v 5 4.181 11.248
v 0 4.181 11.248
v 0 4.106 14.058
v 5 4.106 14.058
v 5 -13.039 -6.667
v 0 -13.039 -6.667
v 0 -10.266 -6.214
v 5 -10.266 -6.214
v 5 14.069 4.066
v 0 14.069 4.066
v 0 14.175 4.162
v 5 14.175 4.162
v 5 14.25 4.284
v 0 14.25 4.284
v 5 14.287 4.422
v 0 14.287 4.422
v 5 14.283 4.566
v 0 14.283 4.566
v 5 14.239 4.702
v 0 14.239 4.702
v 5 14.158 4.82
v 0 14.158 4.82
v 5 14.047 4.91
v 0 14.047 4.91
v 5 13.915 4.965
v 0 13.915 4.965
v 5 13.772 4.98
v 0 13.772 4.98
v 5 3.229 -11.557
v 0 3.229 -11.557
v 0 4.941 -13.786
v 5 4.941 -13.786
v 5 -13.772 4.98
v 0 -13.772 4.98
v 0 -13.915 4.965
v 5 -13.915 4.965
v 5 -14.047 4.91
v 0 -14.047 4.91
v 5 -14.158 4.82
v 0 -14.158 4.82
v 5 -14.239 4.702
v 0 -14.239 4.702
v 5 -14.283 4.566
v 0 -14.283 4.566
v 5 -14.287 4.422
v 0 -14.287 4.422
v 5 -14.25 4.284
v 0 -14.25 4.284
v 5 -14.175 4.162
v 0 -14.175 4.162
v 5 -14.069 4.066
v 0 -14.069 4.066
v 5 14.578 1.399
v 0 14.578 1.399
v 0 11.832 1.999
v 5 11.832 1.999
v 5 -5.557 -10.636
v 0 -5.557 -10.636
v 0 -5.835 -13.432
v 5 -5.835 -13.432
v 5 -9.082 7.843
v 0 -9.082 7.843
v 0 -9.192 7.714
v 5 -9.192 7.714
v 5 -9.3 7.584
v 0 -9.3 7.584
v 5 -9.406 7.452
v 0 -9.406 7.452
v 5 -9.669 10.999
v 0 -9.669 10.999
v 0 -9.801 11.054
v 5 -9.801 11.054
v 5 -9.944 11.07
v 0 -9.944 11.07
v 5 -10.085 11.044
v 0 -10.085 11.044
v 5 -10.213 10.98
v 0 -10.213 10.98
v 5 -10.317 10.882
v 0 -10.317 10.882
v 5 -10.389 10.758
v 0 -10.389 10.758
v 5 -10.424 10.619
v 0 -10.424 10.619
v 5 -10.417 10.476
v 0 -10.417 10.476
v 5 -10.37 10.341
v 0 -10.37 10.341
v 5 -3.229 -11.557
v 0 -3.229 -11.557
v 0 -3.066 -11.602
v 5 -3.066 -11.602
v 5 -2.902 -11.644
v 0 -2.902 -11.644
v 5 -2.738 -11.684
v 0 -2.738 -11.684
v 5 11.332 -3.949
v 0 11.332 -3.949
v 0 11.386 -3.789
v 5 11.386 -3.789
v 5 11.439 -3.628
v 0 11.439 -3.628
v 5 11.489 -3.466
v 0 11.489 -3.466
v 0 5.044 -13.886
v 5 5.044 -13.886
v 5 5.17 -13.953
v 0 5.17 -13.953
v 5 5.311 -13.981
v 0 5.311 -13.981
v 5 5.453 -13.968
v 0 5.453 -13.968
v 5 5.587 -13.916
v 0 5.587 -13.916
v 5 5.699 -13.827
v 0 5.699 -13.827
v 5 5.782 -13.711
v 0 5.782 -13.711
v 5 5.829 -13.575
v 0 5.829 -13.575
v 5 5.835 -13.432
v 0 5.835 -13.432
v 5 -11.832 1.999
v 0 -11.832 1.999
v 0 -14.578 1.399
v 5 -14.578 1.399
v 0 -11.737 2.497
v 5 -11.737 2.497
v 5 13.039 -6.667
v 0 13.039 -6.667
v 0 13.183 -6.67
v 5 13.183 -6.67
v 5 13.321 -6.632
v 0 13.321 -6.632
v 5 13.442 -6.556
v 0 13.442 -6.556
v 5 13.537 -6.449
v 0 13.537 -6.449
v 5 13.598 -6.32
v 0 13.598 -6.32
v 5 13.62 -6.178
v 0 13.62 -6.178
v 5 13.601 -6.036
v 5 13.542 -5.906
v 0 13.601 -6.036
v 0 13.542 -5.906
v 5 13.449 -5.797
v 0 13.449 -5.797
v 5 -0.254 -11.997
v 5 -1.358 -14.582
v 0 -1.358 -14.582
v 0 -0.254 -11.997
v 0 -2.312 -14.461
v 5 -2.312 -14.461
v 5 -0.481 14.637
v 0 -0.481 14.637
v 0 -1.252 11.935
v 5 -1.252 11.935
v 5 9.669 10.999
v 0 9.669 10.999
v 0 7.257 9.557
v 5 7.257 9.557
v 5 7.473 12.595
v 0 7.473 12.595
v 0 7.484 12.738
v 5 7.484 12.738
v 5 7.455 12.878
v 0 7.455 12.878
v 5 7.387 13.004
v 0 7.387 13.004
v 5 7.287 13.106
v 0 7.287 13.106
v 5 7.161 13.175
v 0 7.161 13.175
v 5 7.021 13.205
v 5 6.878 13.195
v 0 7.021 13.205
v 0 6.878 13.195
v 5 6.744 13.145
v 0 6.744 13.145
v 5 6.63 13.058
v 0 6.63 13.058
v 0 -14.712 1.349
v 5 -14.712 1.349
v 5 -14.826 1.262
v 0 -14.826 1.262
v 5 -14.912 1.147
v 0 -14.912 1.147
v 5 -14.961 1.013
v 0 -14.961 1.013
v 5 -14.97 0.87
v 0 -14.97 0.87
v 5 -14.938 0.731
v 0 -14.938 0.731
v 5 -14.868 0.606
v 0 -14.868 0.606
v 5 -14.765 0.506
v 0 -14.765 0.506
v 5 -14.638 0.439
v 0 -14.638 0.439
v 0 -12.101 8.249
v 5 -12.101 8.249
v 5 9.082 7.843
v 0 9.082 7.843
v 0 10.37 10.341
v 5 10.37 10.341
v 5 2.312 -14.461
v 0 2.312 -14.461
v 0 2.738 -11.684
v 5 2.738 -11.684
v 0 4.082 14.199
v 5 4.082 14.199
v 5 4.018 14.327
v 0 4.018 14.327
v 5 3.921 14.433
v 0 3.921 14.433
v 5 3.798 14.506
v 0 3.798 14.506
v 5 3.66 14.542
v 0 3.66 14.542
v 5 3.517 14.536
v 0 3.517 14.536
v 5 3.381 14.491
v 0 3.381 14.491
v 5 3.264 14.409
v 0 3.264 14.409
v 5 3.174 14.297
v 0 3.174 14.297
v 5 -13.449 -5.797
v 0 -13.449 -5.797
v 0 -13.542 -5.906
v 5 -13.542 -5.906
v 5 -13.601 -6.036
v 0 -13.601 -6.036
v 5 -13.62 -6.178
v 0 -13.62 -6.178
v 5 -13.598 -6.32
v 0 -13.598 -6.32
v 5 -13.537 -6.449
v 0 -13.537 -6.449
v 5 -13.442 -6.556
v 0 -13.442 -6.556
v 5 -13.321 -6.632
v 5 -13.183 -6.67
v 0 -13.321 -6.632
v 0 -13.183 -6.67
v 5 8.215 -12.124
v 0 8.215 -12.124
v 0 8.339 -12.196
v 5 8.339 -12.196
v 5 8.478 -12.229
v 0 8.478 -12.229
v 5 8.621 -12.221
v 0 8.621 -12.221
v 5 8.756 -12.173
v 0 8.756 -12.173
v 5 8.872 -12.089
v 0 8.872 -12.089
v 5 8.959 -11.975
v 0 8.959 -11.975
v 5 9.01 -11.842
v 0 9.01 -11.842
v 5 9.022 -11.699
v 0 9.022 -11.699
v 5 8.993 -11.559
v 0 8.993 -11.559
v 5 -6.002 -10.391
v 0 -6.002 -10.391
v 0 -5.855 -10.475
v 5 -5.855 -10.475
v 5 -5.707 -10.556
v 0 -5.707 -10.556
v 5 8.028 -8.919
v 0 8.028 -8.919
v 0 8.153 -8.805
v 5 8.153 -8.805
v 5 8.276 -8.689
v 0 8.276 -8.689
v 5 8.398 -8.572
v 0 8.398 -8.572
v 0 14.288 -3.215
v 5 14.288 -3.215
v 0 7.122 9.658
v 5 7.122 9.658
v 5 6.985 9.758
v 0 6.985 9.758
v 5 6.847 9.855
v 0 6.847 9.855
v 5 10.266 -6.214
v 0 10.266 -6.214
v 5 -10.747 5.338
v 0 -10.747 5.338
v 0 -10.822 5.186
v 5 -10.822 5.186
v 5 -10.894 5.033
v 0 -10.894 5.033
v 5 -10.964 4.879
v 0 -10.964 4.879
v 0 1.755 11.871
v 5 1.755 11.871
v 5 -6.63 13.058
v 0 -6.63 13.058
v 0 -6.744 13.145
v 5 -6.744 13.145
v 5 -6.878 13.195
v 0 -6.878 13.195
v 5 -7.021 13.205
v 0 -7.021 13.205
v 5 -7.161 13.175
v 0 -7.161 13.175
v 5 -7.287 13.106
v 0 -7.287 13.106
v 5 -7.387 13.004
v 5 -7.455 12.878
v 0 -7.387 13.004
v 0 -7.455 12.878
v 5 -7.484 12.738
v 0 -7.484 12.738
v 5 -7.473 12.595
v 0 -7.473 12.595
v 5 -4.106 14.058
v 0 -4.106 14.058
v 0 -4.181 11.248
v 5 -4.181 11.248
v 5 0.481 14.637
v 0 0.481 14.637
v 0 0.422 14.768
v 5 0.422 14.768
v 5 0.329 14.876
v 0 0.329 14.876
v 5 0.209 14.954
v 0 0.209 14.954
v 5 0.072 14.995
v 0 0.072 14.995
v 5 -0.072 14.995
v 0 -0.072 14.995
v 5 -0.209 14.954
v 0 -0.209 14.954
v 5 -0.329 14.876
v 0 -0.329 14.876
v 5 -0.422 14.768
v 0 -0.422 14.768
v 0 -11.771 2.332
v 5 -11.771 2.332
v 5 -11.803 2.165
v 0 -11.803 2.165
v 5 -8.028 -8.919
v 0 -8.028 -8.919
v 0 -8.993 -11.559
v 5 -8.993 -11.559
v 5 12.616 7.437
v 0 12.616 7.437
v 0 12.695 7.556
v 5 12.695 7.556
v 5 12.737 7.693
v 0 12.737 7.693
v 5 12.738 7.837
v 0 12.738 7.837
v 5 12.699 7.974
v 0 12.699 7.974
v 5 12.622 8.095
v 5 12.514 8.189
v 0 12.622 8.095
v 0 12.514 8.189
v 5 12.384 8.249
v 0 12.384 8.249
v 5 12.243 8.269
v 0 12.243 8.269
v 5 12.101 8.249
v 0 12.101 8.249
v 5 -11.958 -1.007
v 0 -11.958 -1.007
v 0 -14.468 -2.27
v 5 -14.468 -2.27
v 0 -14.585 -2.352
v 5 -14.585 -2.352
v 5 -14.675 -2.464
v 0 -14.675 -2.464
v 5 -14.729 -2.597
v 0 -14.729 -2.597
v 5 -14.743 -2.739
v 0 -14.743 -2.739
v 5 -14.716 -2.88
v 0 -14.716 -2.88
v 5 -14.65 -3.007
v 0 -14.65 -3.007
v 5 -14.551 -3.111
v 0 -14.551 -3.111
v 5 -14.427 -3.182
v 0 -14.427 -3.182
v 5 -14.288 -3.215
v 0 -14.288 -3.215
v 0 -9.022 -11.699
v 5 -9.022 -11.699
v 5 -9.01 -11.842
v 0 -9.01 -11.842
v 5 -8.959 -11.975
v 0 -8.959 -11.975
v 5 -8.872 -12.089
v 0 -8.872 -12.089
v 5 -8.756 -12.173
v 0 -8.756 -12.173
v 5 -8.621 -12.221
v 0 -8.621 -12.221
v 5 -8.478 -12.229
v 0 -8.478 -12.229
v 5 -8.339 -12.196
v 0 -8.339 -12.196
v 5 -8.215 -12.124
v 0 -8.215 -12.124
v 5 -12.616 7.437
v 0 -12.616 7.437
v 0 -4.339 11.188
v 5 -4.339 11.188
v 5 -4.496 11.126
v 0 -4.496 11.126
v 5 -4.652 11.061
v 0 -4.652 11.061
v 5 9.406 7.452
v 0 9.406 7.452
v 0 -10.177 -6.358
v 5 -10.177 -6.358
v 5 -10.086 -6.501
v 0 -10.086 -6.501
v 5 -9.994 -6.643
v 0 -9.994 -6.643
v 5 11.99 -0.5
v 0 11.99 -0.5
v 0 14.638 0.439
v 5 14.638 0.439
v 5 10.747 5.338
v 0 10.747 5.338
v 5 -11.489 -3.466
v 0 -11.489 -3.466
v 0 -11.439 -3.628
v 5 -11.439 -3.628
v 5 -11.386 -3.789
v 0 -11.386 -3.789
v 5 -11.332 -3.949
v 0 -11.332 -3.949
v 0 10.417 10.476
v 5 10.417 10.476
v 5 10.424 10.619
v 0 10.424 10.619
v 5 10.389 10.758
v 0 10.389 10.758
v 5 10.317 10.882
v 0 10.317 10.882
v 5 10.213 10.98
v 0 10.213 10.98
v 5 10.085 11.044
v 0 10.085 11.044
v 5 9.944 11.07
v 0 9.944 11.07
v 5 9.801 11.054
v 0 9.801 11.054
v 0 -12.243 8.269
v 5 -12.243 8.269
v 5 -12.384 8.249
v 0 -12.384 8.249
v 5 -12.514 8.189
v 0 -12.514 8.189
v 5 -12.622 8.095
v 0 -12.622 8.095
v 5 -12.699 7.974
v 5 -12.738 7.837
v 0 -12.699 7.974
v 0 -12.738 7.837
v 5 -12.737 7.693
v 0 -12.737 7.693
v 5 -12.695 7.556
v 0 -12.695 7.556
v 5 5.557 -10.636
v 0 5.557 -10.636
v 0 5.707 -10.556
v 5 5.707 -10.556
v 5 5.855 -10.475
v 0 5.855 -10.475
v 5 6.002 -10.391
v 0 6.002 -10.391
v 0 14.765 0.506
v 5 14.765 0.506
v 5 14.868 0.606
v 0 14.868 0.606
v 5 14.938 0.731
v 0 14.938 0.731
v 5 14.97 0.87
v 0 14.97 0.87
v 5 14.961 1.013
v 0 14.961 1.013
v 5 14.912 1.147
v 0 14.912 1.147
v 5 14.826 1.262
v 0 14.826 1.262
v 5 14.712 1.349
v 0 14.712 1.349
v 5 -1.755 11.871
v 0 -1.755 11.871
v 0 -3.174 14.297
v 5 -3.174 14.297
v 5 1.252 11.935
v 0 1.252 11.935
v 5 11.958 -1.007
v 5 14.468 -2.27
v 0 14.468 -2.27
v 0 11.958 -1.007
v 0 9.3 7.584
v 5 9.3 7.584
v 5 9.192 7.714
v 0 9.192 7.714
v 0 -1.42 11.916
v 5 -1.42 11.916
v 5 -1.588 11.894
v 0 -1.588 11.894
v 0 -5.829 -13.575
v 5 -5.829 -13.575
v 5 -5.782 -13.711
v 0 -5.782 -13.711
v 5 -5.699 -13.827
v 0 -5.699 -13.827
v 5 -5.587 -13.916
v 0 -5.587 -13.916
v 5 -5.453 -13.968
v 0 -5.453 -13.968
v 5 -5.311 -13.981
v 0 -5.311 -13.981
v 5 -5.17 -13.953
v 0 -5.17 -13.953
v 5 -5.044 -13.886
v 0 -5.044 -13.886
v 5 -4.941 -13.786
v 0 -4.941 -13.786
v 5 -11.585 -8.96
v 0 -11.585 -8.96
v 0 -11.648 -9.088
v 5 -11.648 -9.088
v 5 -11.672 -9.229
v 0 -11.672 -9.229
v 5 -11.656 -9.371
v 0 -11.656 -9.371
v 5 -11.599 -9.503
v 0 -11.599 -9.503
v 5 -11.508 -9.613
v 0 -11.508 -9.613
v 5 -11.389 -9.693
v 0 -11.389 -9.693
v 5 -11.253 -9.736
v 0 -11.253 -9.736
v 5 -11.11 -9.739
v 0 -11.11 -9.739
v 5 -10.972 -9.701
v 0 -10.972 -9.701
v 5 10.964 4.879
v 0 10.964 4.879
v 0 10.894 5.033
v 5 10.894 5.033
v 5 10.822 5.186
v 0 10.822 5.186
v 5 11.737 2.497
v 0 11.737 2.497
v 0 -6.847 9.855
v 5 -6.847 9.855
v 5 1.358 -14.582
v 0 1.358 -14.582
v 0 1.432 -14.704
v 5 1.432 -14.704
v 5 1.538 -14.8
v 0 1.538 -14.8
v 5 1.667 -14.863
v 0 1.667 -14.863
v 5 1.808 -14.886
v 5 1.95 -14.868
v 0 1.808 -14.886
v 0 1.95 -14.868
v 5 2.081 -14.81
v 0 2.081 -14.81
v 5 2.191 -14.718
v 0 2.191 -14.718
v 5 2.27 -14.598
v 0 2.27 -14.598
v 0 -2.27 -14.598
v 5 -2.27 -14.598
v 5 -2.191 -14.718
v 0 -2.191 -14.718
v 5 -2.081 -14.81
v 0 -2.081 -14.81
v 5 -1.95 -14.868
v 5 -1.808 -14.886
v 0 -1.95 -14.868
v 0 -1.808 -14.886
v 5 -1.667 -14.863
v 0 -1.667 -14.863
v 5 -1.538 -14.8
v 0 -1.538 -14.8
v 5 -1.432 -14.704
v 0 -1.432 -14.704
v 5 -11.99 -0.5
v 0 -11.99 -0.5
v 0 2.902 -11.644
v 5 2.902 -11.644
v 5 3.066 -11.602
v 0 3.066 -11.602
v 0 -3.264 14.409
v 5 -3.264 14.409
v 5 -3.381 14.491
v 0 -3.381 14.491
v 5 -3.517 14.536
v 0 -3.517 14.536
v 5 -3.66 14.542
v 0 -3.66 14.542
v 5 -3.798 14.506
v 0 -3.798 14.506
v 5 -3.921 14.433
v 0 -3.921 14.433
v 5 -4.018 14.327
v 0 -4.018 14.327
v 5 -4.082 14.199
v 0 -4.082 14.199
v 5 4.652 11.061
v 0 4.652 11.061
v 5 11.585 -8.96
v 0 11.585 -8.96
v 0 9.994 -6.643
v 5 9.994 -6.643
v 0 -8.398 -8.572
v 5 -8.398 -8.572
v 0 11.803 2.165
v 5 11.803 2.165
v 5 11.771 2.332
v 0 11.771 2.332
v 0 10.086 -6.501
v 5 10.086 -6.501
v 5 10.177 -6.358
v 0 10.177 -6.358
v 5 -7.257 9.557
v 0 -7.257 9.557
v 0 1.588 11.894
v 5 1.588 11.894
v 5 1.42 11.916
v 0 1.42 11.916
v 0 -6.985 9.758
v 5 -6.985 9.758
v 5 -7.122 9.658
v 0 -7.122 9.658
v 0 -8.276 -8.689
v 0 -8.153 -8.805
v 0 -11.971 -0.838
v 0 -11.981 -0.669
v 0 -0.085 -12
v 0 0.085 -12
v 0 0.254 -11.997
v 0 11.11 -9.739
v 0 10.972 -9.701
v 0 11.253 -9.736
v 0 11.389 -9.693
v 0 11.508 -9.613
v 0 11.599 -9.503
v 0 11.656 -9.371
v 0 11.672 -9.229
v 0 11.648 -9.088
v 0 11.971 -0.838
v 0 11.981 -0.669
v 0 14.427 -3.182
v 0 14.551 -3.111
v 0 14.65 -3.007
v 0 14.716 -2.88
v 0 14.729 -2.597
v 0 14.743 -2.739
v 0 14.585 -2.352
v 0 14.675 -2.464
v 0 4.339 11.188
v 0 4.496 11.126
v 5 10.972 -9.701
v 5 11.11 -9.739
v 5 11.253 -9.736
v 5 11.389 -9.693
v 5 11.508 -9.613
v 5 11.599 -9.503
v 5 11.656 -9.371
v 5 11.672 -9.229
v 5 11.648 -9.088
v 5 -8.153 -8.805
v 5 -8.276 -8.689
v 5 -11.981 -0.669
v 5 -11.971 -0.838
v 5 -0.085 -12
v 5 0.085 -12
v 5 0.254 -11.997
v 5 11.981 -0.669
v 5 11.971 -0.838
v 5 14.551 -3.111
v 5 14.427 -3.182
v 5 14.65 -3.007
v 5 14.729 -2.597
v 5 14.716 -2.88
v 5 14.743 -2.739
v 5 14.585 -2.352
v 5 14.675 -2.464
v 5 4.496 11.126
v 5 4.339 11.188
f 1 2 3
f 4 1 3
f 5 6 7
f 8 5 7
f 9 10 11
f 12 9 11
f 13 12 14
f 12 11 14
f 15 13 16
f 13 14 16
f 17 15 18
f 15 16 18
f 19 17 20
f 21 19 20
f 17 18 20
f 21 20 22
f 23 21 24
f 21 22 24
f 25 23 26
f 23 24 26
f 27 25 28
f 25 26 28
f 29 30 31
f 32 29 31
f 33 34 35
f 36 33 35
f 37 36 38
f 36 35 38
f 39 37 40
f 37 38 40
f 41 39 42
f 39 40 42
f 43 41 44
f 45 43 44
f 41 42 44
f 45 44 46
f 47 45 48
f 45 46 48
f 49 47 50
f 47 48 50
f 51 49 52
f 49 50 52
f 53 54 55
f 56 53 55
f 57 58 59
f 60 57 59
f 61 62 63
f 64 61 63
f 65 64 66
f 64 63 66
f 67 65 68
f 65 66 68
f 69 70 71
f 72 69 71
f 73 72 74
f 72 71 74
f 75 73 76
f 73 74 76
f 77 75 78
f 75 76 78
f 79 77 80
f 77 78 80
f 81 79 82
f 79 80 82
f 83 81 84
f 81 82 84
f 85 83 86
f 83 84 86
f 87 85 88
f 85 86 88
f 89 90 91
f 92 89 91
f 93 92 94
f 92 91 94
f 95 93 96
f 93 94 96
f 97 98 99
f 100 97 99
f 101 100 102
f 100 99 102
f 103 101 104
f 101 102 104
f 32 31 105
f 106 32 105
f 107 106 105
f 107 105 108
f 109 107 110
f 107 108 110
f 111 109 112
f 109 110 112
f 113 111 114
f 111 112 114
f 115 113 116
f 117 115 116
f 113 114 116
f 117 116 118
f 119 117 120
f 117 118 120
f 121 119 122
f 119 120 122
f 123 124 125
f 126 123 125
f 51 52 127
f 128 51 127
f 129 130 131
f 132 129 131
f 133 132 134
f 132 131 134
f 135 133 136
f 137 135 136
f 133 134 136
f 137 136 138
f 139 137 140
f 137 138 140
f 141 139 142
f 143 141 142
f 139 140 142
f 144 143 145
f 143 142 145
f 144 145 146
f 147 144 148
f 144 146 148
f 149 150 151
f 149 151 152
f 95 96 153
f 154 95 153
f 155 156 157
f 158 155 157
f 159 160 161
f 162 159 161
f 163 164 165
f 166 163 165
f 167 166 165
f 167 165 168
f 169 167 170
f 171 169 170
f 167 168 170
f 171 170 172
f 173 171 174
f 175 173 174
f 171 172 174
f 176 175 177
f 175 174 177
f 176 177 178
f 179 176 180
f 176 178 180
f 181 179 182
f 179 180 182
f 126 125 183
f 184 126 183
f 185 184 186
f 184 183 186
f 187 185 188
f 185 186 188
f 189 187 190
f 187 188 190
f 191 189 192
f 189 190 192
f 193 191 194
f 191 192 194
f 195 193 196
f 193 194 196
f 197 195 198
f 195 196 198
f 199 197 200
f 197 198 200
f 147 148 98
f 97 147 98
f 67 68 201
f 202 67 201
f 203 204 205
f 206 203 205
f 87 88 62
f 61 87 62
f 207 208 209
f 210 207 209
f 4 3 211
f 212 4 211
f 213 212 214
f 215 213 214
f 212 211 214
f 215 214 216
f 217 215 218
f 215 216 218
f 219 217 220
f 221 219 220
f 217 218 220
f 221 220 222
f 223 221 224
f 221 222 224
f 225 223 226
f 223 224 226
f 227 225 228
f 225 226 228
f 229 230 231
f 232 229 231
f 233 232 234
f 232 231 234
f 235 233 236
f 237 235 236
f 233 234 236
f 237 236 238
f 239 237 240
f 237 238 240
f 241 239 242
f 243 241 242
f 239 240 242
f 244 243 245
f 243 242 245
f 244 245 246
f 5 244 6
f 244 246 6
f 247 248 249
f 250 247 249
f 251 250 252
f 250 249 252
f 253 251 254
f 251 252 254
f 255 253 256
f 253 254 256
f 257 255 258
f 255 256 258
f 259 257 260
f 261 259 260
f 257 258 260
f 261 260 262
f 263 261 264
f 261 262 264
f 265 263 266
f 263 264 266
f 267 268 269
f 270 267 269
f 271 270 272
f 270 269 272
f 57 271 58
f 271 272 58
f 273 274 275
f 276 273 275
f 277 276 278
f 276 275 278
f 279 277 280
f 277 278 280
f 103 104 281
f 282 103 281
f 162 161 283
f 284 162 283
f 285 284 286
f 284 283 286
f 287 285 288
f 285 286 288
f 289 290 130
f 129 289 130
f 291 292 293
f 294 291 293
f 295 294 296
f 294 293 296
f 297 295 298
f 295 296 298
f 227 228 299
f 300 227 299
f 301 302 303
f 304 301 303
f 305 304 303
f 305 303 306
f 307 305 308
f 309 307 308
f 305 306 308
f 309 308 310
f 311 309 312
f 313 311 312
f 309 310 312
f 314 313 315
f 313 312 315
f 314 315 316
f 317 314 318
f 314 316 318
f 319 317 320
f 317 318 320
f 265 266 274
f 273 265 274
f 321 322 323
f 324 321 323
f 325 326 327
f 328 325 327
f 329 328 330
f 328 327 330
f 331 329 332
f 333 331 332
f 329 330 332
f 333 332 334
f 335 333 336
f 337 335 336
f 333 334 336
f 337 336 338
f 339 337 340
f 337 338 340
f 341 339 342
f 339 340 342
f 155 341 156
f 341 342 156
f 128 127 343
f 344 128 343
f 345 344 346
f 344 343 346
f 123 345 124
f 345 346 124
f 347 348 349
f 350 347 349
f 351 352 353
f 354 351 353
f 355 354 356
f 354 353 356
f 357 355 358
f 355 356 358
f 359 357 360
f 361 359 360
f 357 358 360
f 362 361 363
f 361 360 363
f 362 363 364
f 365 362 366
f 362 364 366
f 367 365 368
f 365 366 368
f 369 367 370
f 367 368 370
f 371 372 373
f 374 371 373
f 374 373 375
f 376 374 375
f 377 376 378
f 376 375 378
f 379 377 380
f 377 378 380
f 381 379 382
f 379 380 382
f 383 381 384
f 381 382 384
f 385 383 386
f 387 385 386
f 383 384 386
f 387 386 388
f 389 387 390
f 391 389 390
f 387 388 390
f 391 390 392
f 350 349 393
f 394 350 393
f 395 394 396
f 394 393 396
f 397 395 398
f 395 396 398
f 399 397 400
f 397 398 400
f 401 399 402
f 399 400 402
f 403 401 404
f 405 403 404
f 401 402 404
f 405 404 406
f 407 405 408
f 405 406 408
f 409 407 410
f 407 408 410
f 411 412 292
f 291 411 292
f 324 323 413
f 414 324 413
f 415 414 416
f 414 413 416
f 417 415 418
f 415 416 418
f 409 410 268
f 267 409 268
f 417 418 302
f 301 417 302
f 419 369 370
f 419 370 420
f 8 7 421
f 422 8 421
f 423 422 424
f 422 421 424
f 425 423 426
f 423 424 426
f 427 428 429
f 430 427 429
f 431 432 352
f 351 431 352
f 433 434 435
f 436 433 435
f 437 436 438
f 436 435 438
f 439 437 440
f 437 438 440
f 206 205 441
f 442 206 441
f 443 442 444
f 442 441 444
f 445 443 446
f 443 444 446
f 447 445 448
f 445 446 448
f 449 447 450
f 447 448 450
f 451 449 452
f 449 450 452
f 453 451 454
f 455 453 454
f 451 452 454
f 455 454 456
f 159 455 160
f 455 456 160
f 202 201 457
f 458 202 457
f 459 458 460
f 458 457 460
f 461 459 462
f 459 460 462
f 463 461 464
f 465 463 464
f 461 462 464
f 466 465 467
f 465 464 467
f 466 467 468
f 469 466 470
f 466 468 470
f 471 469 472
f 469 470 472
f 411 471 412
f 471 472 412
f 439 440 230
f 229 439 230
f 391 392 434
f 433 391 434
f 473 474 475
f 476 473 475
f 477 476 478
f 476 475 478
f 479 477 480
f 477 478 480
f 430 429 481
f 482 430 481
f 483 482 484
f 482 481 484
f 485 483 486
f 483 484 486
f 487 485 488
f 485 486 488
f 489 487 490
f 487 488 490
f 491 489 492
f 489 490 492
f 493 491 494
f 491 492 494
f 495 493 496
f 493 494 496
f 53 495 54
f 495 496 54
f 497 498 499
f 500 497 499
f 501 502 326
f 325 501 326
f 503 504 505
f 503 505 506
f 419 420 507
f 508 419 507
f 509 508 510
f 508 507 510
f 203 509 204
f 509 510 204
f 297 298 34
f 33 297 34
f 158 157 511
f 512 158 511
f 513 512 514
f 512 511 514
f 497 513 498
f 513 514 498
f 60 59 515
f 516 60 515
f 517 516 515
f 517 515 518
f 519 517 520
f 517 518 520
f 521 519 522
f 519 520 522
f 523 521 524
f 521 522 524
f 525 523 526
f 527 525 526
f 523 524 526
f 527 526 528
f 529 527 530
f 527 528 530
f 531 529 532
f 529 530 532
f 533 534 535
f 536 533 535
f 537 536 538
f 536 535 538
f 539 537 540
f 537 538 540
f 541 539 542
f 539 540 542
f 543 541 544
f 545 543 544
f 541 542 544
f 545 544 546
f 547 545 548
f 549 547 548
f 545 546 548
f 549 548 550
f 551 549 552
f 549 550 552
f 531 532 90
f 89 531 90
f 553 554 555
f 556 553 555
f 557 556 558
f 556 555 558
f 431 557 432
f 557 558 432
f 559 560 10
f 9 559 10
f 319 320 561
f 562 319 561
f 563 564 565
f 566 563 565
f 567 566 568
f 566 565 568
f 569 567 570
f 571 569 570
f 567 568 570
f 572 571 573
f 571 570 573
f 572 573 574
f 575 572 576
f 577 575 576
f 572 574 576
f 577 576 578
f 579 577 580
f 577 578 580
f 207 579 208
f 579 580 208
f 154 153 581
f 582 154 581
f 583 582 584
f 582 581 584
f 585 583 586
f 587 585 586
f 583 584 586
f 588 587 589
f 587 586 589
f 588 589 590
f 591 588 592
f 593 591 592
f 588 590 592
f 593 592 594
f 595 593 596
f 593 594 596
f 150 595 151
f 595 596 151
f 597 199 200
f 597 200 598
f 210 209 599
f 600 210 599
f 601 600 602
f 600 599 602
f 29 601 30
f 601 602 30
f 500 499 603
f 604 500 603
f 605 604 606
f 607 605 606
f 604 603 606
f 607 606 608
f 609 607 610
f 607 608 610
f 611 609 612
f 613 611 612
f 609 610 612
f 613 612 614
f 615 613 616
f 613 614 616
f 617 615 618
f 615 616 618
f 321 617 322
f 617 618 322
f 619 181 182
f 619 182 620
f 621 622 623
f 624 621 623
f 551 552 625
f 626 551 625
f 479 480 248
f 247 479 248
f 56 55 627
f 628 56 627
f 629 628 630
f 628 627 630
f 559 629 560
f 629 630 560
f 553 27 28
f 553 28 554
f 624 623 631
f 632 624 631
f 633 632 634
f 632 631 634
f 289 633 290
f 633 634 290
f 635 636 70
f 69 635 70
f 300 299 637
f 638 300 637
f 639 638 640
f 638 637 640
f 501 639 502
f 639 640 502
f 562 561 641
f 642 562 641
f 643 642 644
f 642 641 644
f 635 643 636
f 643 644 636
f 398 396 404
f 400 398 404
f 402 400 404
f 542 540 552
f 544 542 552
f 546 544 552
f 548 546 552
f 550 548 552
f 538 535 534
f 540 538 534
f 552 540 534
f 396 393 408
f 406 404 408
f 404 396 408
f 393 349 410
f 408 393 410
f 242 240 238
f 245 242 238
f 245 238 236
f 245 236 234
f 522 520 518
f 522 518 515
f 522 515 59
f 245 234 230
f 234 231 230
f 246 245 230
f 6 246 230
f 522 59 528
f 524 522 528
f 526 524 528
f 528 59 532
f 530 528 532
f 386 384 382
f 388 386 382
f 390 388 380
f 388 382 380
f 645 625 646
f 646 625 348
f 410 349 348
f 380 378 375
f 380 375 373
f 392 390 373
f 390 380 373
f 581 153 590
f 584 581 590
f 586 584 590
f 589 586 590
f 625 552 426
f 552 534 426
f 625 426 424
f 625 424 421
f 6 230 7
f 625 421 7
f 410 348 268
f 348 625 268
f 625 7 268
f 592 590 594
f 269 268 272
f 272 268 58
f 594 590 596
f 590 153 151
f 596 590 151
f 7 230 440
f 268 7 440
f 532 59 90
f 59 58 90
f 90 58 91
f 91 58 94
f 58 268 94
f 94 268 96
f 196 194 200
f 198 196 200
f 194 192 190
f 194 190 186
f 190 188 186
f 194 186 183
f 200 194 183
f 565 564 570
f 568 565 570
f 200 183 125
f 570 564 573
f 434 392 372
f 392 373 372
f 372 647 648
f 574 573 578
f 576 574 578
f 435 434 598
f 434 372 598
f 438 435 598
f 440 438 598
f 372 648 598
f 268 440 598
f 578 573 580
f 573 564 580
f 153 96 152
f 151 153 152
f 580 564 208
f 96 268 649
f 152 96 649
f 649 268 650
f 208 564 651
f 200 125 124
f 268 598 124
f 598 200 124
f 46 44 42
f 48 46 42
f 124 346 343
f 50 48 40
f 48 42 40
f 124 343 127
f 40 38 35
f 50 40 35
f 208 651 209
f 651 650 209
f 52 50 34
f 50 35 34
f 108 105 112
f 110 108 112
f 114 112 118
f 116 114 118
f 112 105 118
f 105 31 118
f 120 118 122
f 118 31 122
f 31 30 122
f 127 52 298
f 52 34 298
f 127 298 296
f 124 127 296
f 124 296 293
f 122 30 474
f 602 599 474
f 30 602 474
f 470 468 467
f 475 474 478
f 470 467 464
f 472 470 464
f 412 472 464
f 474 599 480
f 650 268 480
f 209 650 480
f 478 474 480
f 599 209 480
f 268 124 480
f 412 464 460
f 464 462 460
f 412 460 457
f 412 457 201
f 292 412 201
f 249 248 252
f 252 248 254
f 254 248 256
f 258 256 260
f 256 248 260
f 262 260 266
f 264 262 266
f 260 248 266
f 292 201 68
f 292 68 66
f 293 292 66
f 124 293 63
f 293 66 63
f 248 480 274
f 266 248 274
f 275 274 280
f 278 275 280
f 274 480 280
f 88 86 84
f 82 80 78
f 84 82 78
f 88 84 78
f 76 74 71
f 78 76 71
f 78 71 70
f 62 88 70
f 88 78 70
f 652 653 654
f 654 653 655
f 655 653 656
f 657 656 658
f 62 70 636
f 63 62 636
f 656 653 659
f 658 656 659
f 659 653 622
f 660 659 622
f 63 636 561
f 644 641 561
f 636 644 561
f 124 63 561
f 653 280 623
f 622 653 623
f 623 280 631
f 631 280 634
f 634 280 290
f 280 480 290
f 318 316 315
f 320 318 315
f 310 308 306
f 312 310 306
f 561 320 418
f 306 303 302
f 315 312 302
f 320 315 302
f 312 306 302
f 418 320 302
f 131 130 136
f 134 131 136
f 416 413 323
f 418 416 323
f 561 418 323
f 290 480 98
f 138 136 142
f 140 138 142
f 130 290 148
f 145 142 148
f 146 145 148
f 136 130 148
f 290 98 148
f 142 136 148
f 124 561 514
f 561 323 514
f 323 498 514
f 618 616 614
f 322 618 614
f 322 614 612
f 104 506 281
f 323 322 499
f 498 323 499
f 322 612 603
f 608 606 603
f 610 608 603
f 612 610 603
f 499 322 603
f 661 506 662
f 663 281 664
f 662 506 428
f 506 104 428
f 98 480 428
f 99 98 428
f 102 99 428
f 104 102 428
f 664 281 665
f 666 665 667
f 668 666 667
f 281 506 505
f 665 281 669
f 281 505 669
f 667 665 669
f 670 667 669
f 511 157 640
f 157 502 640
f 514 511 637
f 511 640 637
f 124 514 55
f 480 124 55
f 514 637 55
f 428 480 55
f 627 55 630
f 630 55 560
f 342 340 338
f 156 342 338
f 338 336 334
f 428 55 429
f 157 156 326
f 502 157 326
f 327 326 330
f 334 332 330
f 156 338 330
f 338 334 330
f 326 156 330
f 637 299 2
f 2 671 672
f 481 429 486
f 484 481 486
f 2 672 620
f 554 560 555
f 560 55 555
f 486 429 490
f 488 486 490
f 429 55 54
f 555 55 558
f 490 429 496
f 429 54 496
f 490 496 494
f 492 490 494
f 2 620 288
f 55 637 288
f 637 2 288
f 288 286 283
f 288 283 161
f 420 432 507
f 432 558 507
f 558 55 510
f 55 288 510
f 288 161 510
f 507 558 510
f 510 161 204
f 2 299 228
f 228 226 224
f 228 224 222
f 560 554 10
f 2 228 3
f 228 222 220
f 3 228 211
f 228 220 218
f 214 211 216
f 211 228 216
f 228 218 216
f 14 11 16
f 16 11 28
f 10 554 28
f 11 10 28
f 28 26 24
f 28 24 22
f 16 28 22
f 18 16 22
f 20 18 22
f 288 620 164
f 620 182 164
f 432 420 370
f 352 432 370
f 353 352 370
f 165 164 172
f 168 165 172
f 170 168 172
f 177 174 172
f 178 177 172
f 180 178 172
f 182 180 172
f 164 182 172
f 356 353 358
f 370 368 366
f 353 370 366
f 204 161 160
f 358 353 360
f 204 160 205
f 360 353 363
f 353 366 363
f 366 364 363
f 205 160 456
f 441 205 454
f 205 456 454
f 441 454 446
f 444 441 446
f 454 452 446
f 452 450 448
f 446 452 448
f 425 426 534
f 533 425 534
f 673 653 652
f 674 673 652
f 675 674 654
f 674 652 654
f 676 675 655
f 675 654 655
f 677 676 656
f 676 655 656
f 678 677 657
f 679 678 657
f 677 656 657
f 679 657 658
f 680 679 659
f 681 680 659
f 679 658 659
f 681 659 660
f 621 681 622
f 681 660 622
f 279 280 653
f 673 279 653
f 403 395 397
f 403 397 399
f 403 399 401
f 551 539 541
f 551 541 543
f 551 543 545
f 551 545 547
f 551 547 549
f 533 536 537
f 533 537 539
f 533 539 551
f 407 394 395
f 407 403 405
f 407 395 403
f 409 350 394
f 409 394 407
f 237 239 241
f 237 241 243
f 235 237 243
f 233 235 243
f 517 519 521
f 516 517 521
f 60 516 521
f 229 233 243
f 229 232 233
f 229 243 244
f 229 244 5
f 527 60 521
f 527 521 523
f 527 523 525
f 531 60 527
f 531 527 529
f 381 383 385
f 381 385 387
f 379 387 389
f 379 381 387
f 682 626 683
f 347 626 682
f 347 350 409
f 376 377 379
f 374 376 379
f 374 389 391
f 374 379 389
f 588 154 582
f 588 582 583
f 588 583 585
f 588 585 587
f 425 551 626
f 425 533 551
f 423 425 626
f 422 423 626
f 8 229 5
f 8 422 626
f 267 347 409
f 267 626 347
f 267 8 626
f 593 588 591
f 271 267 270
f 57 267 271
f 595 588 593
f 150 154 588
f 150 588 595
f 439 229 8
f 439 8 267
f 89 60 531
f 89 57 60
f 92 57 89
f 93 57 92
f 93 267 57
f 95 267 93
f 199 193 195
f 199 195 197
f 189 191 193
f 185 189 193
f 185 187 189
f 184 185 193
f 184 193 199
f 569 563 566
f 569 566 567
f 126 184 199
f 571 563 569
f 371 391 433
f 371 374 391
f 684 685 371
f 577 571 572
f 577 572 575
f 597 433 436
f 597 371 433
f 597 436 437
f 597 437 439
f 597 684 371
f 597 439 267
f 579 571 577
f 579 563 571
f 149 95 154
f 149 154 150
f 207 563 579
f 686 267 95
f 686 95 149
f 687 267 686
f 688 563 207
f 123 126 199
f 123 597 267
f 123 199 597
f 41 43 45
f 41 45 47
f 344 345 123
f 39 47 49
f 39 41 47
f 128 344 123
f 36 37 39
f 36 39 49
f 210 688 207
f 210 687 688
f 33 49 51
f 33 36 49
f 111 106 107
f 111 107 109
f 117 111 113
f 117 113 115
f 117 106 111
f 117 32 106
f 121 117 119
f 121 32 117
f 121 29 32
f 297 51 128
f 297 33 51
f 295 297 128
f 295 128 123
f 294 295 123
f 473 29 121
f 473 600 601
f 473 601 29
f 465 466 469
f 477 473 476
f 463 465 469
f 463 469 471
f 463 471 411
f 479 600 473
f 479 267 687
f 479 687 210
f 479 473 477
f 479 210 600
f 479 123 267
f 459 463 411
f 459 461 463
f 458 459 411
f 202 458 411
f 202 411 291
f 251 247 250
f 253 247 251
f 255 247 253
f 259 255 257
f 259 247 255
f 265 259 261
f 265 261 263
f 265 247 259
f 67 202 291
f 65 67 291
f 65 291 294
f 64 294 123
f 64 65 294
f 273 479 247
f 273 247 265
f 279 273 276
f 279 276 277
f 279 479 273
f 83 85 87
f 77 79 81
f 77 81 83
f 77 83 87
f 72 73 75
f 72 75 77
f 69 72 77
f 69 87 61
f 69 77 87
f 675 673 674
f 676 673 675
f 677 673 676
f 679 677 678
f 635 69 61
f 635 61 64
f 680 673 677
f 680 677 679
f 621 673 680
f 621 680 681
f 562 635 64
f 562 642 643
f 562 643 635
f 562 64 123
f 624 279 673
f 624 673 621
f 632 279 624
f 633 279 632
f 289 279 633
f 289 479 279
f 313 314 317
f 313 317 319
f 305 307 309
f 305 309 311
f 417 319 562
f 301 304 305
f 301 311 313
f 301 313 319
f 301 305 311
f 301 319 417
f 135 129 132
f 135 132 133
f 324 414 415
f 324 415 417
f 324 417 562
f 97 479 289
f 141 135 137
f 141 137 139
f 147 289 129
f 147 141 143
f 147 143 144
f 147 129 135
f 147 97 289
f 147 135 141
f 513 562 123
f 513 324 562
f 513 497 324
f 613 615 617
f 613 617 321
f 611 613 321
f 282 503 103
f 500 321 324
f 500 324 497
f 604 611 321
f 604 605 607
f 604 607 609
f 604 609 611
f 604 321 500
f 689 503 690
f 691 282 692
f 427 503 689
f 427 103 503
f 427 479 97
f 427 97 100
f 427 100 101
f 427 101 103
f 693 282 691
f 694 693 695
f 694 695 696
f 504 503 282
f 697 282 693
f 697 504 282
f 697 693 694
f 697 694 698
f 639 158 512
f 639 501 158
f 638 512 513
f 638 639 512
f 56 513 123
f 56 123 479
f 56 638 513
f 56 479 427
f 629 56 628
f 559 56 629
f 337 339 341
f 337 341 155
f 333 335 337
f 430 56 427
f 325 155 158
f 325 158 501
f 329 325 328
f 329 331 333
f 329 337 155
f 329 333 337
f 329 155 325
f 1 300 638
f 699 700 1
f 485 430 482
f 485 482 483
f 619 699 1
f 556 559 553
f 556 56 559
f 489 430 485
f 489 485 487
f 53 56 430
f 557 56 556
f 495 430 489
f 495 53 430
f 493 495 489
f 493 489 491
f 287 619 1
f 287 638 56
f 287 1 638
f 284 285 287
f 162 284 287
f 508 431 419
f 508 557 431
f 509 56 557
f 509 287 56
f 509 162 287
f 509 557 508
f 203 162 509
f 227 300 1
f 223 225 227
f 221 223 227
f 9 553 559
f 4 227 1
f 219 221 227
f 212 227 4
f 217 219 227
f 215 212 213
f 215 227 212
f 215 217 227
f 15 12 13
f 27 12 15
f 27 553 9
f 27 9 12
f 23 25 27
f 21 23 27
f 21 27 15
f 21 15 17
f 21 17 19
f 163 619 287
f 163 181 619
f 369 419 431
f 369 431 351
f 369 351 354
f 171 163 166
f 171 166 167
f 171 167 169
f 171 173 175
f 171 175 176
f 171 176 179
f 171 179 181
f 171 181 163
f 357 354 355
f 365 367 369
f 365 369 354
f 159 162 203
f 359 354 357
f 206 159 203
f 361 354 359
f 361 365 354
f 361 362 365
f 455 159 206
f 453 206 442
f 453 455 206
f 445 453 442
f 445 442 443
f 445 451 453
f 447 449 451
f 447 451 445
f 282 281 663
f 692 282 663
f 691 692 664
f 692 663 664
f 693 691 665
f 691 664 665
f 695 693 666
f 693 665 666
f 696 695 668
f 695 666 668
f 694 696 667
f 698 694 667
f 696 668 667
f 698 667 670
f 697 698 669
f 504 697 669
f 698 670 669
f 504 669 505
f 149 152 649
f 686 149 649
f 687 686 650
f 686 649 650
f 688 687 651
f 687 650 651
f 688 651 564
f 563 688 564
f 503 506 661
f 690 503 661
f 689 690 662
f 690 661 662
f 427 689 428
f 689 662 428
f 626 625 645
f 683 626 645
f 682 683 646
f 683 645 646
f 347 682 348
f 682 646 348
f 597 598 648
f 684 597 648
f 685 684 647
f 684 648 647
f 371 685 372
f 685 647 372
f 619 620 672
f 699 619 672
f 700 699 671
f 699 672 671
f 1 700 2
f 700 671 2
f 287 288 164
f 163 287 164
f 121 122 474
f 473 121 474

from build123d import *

# Parameters (mm, degrees)
F1_DEPTH = 5


with BuildPart() as f1:
    # F0 (on Right) → F1 (new body)
    with BuildSketch(Plane.YZ):
        with BuildLine():
            Line((1.251901, 11.934519), (0.480814, 14.637179))
            ThreePointArc((0.480814, 14.637179), (0, 15), (-0.480814, 14.637179))
            Line((-0.480814, 14.637179), (-1.251901, 11.934519))
            ThreePointArc((-1.251901, 11.934519), (0, 12), (1.251901, 11.934519))
        make_face()
        with BuildLine():
            ThreePointArc((1.755424, 11.870909), (1.503999, 11.905376), (1.251901, 11.934519))
            ThreePointArc((1.251901, 11.934519), (0, 12), (-1.251901, 11.934519))
            ThreePointArc((-1.251901, 11.934519), (-1.503999, 11.905376), (-1.755424, 11.870909))
            ThreePointArc((-1.755424, 11.870909), (-2.984279, 11.622998), (-4.180564, 11.248239))
            ThreePointArc((-4.180564, 11.248239), (-4.417495, 11.157318), (-4.652449, 11.061407))
            ThreePointArc((-4.652449, 11.061407), (-5.781044, 10.51568), (-6.846547, 9.855191))
            ThreePointArc((-6.846547, 9.855191), (-7.053423, 9.708204), (-7.257144, 9.556875))
            ThreePointArc((-7.257144, 9.556875), (-8.214565, 8.747624), (-9.082337, 7.842905))
            ThreePointArc((-9.082337, 7.842905), (-9.246159, 7.649088), (-9.405846, 7.45185))
            ThreePointArc((-9.405846, 7.45185), (-10.131935, 6.429922), (-10.74745, 5.33782))
            ThreePointArc((-10.74745, 5.33782), (-10.857925, 5.109351), (-10.963544, 4.878598))
            ThreePointArc((-10.963544, 4.878598), (-11.412678, 3.708204), (-11.737261, 2.497341))
            ThreePointArc((-11.737261, 2.497341), (-11.787447, 2.248576), (-11.832361, 1.998805))
            ThreePointArc((-11.832361, 1.998805), (-11.976321, 0.753486), (-11.989576, -0.500056))
            ThreePointArc((-11.989576, -0.500056), (-11.976321, -0.753486), (-11.957709, -1.00658))
            ThreePointArc((-11.957709, -1.00658), (-11.787447, -2.248576), (-11.488543, -3.466032))
            ThreePointArc((-11.488543, -3.466032), (-11.412678, -3.708204), (-11.331709, -3.948717))
            ThreePointArc((-11.331709, -3.948717), (-10.857925, -5.109351), (-10.265642, -6.214225))
            ThreePointArc((-10.265642, -6.214225), (-10.131935, -6.429922), (-9.993697, -6.642743))
            ThreePointArc((-9.993697, -6.642743), (-9.246159, -7.649088), (-8.397713, -8.571955))
            ThreePointArc((-8.397713, -8.571955), (-8.214565, -8.747624), (-8.027743, -8.91938))
            ThreePointArc((-8.027743, -8.91938), (-7.053423, -9.708204), (-6.002125, -10.391077))
            ThreePointArc((-6.002125, -10.391077), (-5.781044, -10.51568), (-5.557377, -10.63558))
            ThreePointArc((-5.557377, -10.63558), (-4.417495, -11.157318), (-3.229402, -11.557291))
            ThreePointArc((-3.229402, -11.557291), (-2.984279, -11.622998), (-2.737821, -11.683507))
            ThreePointArc((-2.737821, -11.683507), (-1.503999, -11.905376), (-0.253763, -11.997317))
            ThreePointArc((-0.253763, -11.997317), (0, -12), (0.253763, -11.997317))
            ThreePointArc((0.253763, -11.997317), (1.503999, -11.905376), (2.737821, -11.683507))
            ThreePointArc((2.737821, -11.683507), (2.984279, -11.622998), (3.229402, -11.557291))
            ThreePointArc((3.229402, -11.557291), (4.417495, -11.157318), (5.557377, -10.63558))
            ThreePointArc((5.557377, -10.63558), (5.781044, -10.51568), (6.002125, -10.391077))
            ThreePointArc((6.002125, -10.391077), (7.053423, -9.708204), (8.027743, -8.91938))
            ThreePointArc((8.027743, -8.91938), (8.214565, -8.747624), (8.397713, -8.571955))
            ThreePointArc((8.397713, -8.571955), (9.246159, -7.649088), (9.993697, -6.642743))
            ThreePointArc((9.993697, -6.642743), (10.131935, -6.429922), (10.265642, -6.214225))
            ThreePointArc((10.265642, -6.214225), (10.857925, -5.109351), (11.331709, -3.948717))
            ThreePointArc((11.331709, -3.948717), (11.412678, -3.708204), (11.488543, -3.466032))
            ThreePointArc((11.488543, -3.466032), (11.787447, -2.248576), (11.957709, -1.00658))
            ThreePointArc((11.957709, -1.00658), (11.976321, -0.753486), (11.989576, -0.500056))
            ThreePointArc((11.989576, -0.500056), (11.997394, -0.250082), (12, 0))
            ThreePointArc((12, 0), (11.958017, 1.002911), (11.832361, 1.998805))
            ThreePointArc((11.832361, 1.998805), (11.787447, 2.248576), (11.737261, 2.497341))
            ThreePointArc((11.737261, 2.497341), (11.412678, 3.708204), (10.963544, 4.878598))
            ThreePointArc((10.963544, 4.878598), (10.857925, 5.109351), (10.74745, 5.33782))
            ThreePointArc((10.74745, 5.33782), (10.131935, 6.429922), (9.405846, 7.45185))
            ThreePointArc((9.405846, 7.45185), (9.246159, 7.649088), (9.082337, 7.842905))
            ThreePointArc((9.082337, 7.842905), (8.214565, 8.747624), (7.257144, 9.556875))
            ThreePointArc((7.257144, 9.556875), (7.053423, 9.708204), (6.846547, 9.855191))
            ThreePointArc((6.846547, 9.855191), (5.781044, 10.51568), (4.652449, 11.061407))
            ThreePointArc((4.652449, 11.061407), (4.417495, 11.157318), (4.180564, 11.248239))
            ThreePointArc((4.180564, 11.248239), (2.984279, 11.622998), (1.755424, 11.870909))
        make_face()
        with BuildLine():
            Line((3.17441, 14.296899), (1.755424, 11.870909))
            ThreePointArc((1.755424, 11.870909), (2.984279, 11.622998), (4.180564, 11.248239))
            Line((4.180564, 11.248239), (4.105827, 14.057752))
            ThreePointArc((4.105827, 14.057752), (3.730348, 14.528747), (3.17441, 14.296899))
        make_face()
        with BuildLine():
            ThreePointArc((-4.180564, 11.248239), (-2.984279, 11.622998), (-1.755424, 11.870909))
            Line((-1.755424, 11.870909), (-3.17441, 14.296899))
            ThreePointArc((-3.17441, 14.296899), (-3.730348, 14.528747), (-4.105827, 14.057752))
            Line((-4.105827, 14.057752), (-4.180564, 11.248239))
        make_face()
        with BuildLine():
            Line((6.630175, 13.058292), (4.652449, 11.061407))
            ThreePointArc((4.652449, 11.061407), (5.781044, 10.51568), (6.846547, 9.855191))
            Line((6.846547, 9.855191), (7.472855, 12.595024))
            ThreePointArc((7.472855, 12.595024), (7.226305, 13.1446), (6.630175, 13.058292))
        make_face()
        with BuildLine():
            ThreePointArc((-6.846547, 9.855191), (-5.781044, 10.51568), (-4.652449, 11.061407))
            Line((-4.652449, 11.061407), (-6.630175, 13.058292))
            ThreePointArc((-6.630175, 13.058292), (-7.226305, 13.1446), (-7.472855, 12.595024))
            Line((-7.472855, 12.595024), (-6.846547, 9.855191))
        make_face()
        with BuildLine():
            Line((9.669341, 10.999184), (7.257144, 9.556875))
            ThreePointArc((7.257144, 9.556875), (8.214565, 8.747624), (9.082337, 7.842905))
            Line((9.082337, 7.842905), (10.370337, 10.340905))
            ThreePointArc((10.370337, 10.340905), (10.268207, 10.934529), (9.669341, 10.999184))
        make_face()
        with BuildLine():
            ThreePointArc((-9.082337, 7.842905), (-8.214565, 8.747624), (-7.257144, 9.556875))
            Line((-7.257144, 9.556875), (-9.669341, 10.999184))
            ThreePointArc((-9.669341, 10.999184), (-10.268207, 10.934529), (-10.370337, 10.340905))
            Line((-10.370337, 10.340905), (-9.082337, 7.842905))
        make_face()
        with BuildLine():
            Line((12.100946, 8.248957), (9.405846, 7.45185))
            ThreePointArc((9.405846, 7.45185), (10.131935, 6.429922), (10.74745, 5.33782))
            Line((10.74745, 5.33782), (12.616212, 7.437028))
            ThreePointArc((12.616212, 7.437028), (12.664919, 8.037402), (12.100946, 8.248957))
        make_face()
        with BuildLine():
            ThreePointArc((-10.74745, 5.33782), (-10.131935, 6.429922), (-9.405846, 7.45185))
            Line((-9.405846, 7.45185), (-12.100946, 8.248957))
            ThreePointArc((-12.100946, 8.248957), (-12.664919, 8.037402), (-12.616212, 7.437028))
            Line((-12.616212, 7.437028), (-10.74745, 5.33782))
        make_face()
        with BuildLine():
            Line((13.772205, 4.980418), (10.963544, 4.878598))
            ThreePointArc((10.963544, 4.878598), (11.412678, 3.708204), (11.737261, 2.497341))
            Line((11.737261, 2.497341), (14.069364, 4.065856))
            ThreePointArc((14.069364, 4.065856), (14.265848, 4.635255), (13.772205, 4.980418))
        make_face()
        with BuildLine():
            ThreePointArc((-11.737261, 2.497341), (-11.412678, 3.708204), (-10.963544, 4.878598))
            Line((-10.963544, 4.878598), (-13.772205, 4.980418))
            ThreePointArc((-13.772205, 4.980418), (-14.265848, 4.635255), (-14.069364, 4.065856))
            Line((-14.069364, 4.065856), (-11.737261, 2.497341))
        make_face()
        with BuildLine():
            Line((14.578106, 1.398941), (11.832361, 1.998805))
            ThreePointArc((11.832361, 1.998805), (11.958017, 1.002911), (12, 0))
            ThreePointArc((12, 0), (11.997394, -0.250082), (11.989576, -0.500056))
            Line((11.989576, -0.500056), (14.638487, 0.439211))
            ThreePointArc((14.638487, 0.439211), (14.970401, 0.941858), (14.578106, 1.398941))
        make_face()
        with BuildLine():
            ThreePointArc((-11.989576, -0.500056), (-11.976321, 0.753486), (-11.832361, 1.998805))
            Line((-11.832361, 1.998805), (-14.578106, 1.398941))
            ThreePointArc((-14.578106, 1.398941), (-14.970401, 0.941858), (-14.638487, 0.439211))
            Line((-14.638487, 0.439211), (-11.989576, -0.500056))
        make_face()
        with BuildLine():
            ThreePointArc((-11.488543, -3.466032), (-11.787447, -2.248576), (-11.957709, -1.00658))
            Line((-11.957709, -1.00658), (-14.46801, -2.270437))
            ThreePointArc((-14.46801, -2.270437), (-14.734309, -2.81072), (-14.287819, -3.215031))
            Line((-14.287819, -3.215031), (-11.488543, -3.466032))
        make_face()
        with BuildLine():
            Line((14.46801, -2.270437), (11.957709, -1.00658))
            ThreePointArc((11.957709, -1.00658), (11.787447, -2.248576), (11.488543, -3.466032))
            Line((11.488543, -3.466032), (14.287819, -3.215031))
            ThreePointArc((14.287819, -3.215031), (14.734309, -2.81072), (14.46801, -2.270437))
        make_face()
        with BuildLine():
            ThreePointArc((-10.265642, -6.214225), (-10.857925, -5.109351), (-11.331709, -3.948717))
            Line((-11.331709, -3.948717), (-13.448836, -5.797155))
            ThreePointArc((-13.448836, -5.797155), (-13.572406, -6.386689), (-13.039395, -6.667261))
            Line((-13.039395, -6.667261), (-10.265642, -6.214225))
        make_face()
        with BuildLine():
            Line((13.448836, -5.797155), (11.331709, -3.948717))
            ThreePointArc((11.331709, -3.948717), (10.857925, -5.109351), (10.265642, -6.214225))
            Line((10.265642, -6.214225), (13.039395, -6.667261))
            ThreePointArc((13.039395, -6.667261), (13.572406, -6.386689), (13.448836, -5.797155))
        make_face()
        with BuildLine():
            ThreePointArc((-8.397713, -8.571955), (-9.246159, -7.649088), (-9.993697, -6.642743))
            Line((-9.993697, -6.642743), (-11.584623, -8.959616))
            ThreePointArc((-11.584623, -8.959616), (-11.557699, -9.56136), (-10.971658, -9.700563))
            Line((-10.971658, -9.700563), (-8.397713, -8.571955))
        make_face()
        with BuildLine():
            Line((11.584623, -8.959616), (9.993697, -6.642743))
            ThreePointArc((9.993697, -6.642743), (9.246159, -7.649088), (8.397713, -8.571955))
            Line((8.397713, -8.571955), (10.971658, -9.700563))
            ThreePointArc((10.971658, -9.700563), (11.557699, -9.56136), (11.584623, -8.959616))
        make_face()
        with BuildLine():
            ThreePointArc((-6.002125, -10.391077), (-7.053423, -9.708204), (-8.027743, -8.91938))
            Line((-8.027743, -8.91938), (-8.992505, -11.559112))
            ThreePointArc((-8.992505, -11.559112), (-8.816779, -12.135255), (-8.214532, -12.124342))
            Line((-8.214532, -12.124342), (-6.002125, -10.391077))
        make_face()
        with BuildLine():
            Line((8.992505, -11.559112), (8.027743, -8.91938))
            ThreePointArc((8.027743, -8.91938), (7.053423, -9.708204), (6.002125, -10.391077))
            Line((6.002125, -10.391077), (8.214532, -12.124342))
            ThreePointArc((8.214532, -12.124342), (8.816779, -12.135255), (8.992505, -11.559112))
        make_face()
        with BuildLine():
            ThreePointArc((-3.229402, -11.557291), (-4.417495, -11.157318), (-5.557377, -10.63558))
            Line((-5.557377, -10.63558), (-5.835354, -13.432306))
            ThreePointArc((-5.835354, -13.432306), (-5.521868, -13.946647), (-4.941256, -13.786305))
            Line((-4.941256, -13.786305), (-3.229402, -11.557291))
        make_face()
        with BuildLine():
            Line((5.835354, -13.432306), (5.557377, -10.63558))
            ThreePointArc((5.557377, -10.63558), (4.417495, -11.157318), (3.229402, -11.557291))
            Line((3.229402, -11.557291), (4.941256, -13.786305))
            ThreePointArc((4.941256, -13.786305), (5.521868, -13.946647), (5.835354, -13.432306))
        make_face()
        with BuildLine():
            ThreePointArc((-0.253763, -11.997317), (-1.503999, -11.905376), (-2.737821, -11.683507))
            Line((-2.737821, -11.683507), (-2.311547, -14.461499))
            ThreePointArc((-2.311547, -14.461499), (-1.879999, -14.881721), (-1.357503, -14.582023))
            Line((-1.357503, -14.582023), (-0.253763, -11.997317))
        make_face()
        with BuildLine():
            Line((2.311547, -14.461499), (2.737821, -11.683507))
            ThreePointArc((2.737821, -11.683507), (1.503999, -11.905376), (0.253763, -11.997317))
            Line((0.253763, -11.997317), (1.357503, -14.582023))
            ThreePointArc((1.357503, -14.582023), (1.879999, -14.881721), (2.311547, -14.461499))
        make_face()
    extrude(amount=F1_DEPTH)


solid = f1.part
